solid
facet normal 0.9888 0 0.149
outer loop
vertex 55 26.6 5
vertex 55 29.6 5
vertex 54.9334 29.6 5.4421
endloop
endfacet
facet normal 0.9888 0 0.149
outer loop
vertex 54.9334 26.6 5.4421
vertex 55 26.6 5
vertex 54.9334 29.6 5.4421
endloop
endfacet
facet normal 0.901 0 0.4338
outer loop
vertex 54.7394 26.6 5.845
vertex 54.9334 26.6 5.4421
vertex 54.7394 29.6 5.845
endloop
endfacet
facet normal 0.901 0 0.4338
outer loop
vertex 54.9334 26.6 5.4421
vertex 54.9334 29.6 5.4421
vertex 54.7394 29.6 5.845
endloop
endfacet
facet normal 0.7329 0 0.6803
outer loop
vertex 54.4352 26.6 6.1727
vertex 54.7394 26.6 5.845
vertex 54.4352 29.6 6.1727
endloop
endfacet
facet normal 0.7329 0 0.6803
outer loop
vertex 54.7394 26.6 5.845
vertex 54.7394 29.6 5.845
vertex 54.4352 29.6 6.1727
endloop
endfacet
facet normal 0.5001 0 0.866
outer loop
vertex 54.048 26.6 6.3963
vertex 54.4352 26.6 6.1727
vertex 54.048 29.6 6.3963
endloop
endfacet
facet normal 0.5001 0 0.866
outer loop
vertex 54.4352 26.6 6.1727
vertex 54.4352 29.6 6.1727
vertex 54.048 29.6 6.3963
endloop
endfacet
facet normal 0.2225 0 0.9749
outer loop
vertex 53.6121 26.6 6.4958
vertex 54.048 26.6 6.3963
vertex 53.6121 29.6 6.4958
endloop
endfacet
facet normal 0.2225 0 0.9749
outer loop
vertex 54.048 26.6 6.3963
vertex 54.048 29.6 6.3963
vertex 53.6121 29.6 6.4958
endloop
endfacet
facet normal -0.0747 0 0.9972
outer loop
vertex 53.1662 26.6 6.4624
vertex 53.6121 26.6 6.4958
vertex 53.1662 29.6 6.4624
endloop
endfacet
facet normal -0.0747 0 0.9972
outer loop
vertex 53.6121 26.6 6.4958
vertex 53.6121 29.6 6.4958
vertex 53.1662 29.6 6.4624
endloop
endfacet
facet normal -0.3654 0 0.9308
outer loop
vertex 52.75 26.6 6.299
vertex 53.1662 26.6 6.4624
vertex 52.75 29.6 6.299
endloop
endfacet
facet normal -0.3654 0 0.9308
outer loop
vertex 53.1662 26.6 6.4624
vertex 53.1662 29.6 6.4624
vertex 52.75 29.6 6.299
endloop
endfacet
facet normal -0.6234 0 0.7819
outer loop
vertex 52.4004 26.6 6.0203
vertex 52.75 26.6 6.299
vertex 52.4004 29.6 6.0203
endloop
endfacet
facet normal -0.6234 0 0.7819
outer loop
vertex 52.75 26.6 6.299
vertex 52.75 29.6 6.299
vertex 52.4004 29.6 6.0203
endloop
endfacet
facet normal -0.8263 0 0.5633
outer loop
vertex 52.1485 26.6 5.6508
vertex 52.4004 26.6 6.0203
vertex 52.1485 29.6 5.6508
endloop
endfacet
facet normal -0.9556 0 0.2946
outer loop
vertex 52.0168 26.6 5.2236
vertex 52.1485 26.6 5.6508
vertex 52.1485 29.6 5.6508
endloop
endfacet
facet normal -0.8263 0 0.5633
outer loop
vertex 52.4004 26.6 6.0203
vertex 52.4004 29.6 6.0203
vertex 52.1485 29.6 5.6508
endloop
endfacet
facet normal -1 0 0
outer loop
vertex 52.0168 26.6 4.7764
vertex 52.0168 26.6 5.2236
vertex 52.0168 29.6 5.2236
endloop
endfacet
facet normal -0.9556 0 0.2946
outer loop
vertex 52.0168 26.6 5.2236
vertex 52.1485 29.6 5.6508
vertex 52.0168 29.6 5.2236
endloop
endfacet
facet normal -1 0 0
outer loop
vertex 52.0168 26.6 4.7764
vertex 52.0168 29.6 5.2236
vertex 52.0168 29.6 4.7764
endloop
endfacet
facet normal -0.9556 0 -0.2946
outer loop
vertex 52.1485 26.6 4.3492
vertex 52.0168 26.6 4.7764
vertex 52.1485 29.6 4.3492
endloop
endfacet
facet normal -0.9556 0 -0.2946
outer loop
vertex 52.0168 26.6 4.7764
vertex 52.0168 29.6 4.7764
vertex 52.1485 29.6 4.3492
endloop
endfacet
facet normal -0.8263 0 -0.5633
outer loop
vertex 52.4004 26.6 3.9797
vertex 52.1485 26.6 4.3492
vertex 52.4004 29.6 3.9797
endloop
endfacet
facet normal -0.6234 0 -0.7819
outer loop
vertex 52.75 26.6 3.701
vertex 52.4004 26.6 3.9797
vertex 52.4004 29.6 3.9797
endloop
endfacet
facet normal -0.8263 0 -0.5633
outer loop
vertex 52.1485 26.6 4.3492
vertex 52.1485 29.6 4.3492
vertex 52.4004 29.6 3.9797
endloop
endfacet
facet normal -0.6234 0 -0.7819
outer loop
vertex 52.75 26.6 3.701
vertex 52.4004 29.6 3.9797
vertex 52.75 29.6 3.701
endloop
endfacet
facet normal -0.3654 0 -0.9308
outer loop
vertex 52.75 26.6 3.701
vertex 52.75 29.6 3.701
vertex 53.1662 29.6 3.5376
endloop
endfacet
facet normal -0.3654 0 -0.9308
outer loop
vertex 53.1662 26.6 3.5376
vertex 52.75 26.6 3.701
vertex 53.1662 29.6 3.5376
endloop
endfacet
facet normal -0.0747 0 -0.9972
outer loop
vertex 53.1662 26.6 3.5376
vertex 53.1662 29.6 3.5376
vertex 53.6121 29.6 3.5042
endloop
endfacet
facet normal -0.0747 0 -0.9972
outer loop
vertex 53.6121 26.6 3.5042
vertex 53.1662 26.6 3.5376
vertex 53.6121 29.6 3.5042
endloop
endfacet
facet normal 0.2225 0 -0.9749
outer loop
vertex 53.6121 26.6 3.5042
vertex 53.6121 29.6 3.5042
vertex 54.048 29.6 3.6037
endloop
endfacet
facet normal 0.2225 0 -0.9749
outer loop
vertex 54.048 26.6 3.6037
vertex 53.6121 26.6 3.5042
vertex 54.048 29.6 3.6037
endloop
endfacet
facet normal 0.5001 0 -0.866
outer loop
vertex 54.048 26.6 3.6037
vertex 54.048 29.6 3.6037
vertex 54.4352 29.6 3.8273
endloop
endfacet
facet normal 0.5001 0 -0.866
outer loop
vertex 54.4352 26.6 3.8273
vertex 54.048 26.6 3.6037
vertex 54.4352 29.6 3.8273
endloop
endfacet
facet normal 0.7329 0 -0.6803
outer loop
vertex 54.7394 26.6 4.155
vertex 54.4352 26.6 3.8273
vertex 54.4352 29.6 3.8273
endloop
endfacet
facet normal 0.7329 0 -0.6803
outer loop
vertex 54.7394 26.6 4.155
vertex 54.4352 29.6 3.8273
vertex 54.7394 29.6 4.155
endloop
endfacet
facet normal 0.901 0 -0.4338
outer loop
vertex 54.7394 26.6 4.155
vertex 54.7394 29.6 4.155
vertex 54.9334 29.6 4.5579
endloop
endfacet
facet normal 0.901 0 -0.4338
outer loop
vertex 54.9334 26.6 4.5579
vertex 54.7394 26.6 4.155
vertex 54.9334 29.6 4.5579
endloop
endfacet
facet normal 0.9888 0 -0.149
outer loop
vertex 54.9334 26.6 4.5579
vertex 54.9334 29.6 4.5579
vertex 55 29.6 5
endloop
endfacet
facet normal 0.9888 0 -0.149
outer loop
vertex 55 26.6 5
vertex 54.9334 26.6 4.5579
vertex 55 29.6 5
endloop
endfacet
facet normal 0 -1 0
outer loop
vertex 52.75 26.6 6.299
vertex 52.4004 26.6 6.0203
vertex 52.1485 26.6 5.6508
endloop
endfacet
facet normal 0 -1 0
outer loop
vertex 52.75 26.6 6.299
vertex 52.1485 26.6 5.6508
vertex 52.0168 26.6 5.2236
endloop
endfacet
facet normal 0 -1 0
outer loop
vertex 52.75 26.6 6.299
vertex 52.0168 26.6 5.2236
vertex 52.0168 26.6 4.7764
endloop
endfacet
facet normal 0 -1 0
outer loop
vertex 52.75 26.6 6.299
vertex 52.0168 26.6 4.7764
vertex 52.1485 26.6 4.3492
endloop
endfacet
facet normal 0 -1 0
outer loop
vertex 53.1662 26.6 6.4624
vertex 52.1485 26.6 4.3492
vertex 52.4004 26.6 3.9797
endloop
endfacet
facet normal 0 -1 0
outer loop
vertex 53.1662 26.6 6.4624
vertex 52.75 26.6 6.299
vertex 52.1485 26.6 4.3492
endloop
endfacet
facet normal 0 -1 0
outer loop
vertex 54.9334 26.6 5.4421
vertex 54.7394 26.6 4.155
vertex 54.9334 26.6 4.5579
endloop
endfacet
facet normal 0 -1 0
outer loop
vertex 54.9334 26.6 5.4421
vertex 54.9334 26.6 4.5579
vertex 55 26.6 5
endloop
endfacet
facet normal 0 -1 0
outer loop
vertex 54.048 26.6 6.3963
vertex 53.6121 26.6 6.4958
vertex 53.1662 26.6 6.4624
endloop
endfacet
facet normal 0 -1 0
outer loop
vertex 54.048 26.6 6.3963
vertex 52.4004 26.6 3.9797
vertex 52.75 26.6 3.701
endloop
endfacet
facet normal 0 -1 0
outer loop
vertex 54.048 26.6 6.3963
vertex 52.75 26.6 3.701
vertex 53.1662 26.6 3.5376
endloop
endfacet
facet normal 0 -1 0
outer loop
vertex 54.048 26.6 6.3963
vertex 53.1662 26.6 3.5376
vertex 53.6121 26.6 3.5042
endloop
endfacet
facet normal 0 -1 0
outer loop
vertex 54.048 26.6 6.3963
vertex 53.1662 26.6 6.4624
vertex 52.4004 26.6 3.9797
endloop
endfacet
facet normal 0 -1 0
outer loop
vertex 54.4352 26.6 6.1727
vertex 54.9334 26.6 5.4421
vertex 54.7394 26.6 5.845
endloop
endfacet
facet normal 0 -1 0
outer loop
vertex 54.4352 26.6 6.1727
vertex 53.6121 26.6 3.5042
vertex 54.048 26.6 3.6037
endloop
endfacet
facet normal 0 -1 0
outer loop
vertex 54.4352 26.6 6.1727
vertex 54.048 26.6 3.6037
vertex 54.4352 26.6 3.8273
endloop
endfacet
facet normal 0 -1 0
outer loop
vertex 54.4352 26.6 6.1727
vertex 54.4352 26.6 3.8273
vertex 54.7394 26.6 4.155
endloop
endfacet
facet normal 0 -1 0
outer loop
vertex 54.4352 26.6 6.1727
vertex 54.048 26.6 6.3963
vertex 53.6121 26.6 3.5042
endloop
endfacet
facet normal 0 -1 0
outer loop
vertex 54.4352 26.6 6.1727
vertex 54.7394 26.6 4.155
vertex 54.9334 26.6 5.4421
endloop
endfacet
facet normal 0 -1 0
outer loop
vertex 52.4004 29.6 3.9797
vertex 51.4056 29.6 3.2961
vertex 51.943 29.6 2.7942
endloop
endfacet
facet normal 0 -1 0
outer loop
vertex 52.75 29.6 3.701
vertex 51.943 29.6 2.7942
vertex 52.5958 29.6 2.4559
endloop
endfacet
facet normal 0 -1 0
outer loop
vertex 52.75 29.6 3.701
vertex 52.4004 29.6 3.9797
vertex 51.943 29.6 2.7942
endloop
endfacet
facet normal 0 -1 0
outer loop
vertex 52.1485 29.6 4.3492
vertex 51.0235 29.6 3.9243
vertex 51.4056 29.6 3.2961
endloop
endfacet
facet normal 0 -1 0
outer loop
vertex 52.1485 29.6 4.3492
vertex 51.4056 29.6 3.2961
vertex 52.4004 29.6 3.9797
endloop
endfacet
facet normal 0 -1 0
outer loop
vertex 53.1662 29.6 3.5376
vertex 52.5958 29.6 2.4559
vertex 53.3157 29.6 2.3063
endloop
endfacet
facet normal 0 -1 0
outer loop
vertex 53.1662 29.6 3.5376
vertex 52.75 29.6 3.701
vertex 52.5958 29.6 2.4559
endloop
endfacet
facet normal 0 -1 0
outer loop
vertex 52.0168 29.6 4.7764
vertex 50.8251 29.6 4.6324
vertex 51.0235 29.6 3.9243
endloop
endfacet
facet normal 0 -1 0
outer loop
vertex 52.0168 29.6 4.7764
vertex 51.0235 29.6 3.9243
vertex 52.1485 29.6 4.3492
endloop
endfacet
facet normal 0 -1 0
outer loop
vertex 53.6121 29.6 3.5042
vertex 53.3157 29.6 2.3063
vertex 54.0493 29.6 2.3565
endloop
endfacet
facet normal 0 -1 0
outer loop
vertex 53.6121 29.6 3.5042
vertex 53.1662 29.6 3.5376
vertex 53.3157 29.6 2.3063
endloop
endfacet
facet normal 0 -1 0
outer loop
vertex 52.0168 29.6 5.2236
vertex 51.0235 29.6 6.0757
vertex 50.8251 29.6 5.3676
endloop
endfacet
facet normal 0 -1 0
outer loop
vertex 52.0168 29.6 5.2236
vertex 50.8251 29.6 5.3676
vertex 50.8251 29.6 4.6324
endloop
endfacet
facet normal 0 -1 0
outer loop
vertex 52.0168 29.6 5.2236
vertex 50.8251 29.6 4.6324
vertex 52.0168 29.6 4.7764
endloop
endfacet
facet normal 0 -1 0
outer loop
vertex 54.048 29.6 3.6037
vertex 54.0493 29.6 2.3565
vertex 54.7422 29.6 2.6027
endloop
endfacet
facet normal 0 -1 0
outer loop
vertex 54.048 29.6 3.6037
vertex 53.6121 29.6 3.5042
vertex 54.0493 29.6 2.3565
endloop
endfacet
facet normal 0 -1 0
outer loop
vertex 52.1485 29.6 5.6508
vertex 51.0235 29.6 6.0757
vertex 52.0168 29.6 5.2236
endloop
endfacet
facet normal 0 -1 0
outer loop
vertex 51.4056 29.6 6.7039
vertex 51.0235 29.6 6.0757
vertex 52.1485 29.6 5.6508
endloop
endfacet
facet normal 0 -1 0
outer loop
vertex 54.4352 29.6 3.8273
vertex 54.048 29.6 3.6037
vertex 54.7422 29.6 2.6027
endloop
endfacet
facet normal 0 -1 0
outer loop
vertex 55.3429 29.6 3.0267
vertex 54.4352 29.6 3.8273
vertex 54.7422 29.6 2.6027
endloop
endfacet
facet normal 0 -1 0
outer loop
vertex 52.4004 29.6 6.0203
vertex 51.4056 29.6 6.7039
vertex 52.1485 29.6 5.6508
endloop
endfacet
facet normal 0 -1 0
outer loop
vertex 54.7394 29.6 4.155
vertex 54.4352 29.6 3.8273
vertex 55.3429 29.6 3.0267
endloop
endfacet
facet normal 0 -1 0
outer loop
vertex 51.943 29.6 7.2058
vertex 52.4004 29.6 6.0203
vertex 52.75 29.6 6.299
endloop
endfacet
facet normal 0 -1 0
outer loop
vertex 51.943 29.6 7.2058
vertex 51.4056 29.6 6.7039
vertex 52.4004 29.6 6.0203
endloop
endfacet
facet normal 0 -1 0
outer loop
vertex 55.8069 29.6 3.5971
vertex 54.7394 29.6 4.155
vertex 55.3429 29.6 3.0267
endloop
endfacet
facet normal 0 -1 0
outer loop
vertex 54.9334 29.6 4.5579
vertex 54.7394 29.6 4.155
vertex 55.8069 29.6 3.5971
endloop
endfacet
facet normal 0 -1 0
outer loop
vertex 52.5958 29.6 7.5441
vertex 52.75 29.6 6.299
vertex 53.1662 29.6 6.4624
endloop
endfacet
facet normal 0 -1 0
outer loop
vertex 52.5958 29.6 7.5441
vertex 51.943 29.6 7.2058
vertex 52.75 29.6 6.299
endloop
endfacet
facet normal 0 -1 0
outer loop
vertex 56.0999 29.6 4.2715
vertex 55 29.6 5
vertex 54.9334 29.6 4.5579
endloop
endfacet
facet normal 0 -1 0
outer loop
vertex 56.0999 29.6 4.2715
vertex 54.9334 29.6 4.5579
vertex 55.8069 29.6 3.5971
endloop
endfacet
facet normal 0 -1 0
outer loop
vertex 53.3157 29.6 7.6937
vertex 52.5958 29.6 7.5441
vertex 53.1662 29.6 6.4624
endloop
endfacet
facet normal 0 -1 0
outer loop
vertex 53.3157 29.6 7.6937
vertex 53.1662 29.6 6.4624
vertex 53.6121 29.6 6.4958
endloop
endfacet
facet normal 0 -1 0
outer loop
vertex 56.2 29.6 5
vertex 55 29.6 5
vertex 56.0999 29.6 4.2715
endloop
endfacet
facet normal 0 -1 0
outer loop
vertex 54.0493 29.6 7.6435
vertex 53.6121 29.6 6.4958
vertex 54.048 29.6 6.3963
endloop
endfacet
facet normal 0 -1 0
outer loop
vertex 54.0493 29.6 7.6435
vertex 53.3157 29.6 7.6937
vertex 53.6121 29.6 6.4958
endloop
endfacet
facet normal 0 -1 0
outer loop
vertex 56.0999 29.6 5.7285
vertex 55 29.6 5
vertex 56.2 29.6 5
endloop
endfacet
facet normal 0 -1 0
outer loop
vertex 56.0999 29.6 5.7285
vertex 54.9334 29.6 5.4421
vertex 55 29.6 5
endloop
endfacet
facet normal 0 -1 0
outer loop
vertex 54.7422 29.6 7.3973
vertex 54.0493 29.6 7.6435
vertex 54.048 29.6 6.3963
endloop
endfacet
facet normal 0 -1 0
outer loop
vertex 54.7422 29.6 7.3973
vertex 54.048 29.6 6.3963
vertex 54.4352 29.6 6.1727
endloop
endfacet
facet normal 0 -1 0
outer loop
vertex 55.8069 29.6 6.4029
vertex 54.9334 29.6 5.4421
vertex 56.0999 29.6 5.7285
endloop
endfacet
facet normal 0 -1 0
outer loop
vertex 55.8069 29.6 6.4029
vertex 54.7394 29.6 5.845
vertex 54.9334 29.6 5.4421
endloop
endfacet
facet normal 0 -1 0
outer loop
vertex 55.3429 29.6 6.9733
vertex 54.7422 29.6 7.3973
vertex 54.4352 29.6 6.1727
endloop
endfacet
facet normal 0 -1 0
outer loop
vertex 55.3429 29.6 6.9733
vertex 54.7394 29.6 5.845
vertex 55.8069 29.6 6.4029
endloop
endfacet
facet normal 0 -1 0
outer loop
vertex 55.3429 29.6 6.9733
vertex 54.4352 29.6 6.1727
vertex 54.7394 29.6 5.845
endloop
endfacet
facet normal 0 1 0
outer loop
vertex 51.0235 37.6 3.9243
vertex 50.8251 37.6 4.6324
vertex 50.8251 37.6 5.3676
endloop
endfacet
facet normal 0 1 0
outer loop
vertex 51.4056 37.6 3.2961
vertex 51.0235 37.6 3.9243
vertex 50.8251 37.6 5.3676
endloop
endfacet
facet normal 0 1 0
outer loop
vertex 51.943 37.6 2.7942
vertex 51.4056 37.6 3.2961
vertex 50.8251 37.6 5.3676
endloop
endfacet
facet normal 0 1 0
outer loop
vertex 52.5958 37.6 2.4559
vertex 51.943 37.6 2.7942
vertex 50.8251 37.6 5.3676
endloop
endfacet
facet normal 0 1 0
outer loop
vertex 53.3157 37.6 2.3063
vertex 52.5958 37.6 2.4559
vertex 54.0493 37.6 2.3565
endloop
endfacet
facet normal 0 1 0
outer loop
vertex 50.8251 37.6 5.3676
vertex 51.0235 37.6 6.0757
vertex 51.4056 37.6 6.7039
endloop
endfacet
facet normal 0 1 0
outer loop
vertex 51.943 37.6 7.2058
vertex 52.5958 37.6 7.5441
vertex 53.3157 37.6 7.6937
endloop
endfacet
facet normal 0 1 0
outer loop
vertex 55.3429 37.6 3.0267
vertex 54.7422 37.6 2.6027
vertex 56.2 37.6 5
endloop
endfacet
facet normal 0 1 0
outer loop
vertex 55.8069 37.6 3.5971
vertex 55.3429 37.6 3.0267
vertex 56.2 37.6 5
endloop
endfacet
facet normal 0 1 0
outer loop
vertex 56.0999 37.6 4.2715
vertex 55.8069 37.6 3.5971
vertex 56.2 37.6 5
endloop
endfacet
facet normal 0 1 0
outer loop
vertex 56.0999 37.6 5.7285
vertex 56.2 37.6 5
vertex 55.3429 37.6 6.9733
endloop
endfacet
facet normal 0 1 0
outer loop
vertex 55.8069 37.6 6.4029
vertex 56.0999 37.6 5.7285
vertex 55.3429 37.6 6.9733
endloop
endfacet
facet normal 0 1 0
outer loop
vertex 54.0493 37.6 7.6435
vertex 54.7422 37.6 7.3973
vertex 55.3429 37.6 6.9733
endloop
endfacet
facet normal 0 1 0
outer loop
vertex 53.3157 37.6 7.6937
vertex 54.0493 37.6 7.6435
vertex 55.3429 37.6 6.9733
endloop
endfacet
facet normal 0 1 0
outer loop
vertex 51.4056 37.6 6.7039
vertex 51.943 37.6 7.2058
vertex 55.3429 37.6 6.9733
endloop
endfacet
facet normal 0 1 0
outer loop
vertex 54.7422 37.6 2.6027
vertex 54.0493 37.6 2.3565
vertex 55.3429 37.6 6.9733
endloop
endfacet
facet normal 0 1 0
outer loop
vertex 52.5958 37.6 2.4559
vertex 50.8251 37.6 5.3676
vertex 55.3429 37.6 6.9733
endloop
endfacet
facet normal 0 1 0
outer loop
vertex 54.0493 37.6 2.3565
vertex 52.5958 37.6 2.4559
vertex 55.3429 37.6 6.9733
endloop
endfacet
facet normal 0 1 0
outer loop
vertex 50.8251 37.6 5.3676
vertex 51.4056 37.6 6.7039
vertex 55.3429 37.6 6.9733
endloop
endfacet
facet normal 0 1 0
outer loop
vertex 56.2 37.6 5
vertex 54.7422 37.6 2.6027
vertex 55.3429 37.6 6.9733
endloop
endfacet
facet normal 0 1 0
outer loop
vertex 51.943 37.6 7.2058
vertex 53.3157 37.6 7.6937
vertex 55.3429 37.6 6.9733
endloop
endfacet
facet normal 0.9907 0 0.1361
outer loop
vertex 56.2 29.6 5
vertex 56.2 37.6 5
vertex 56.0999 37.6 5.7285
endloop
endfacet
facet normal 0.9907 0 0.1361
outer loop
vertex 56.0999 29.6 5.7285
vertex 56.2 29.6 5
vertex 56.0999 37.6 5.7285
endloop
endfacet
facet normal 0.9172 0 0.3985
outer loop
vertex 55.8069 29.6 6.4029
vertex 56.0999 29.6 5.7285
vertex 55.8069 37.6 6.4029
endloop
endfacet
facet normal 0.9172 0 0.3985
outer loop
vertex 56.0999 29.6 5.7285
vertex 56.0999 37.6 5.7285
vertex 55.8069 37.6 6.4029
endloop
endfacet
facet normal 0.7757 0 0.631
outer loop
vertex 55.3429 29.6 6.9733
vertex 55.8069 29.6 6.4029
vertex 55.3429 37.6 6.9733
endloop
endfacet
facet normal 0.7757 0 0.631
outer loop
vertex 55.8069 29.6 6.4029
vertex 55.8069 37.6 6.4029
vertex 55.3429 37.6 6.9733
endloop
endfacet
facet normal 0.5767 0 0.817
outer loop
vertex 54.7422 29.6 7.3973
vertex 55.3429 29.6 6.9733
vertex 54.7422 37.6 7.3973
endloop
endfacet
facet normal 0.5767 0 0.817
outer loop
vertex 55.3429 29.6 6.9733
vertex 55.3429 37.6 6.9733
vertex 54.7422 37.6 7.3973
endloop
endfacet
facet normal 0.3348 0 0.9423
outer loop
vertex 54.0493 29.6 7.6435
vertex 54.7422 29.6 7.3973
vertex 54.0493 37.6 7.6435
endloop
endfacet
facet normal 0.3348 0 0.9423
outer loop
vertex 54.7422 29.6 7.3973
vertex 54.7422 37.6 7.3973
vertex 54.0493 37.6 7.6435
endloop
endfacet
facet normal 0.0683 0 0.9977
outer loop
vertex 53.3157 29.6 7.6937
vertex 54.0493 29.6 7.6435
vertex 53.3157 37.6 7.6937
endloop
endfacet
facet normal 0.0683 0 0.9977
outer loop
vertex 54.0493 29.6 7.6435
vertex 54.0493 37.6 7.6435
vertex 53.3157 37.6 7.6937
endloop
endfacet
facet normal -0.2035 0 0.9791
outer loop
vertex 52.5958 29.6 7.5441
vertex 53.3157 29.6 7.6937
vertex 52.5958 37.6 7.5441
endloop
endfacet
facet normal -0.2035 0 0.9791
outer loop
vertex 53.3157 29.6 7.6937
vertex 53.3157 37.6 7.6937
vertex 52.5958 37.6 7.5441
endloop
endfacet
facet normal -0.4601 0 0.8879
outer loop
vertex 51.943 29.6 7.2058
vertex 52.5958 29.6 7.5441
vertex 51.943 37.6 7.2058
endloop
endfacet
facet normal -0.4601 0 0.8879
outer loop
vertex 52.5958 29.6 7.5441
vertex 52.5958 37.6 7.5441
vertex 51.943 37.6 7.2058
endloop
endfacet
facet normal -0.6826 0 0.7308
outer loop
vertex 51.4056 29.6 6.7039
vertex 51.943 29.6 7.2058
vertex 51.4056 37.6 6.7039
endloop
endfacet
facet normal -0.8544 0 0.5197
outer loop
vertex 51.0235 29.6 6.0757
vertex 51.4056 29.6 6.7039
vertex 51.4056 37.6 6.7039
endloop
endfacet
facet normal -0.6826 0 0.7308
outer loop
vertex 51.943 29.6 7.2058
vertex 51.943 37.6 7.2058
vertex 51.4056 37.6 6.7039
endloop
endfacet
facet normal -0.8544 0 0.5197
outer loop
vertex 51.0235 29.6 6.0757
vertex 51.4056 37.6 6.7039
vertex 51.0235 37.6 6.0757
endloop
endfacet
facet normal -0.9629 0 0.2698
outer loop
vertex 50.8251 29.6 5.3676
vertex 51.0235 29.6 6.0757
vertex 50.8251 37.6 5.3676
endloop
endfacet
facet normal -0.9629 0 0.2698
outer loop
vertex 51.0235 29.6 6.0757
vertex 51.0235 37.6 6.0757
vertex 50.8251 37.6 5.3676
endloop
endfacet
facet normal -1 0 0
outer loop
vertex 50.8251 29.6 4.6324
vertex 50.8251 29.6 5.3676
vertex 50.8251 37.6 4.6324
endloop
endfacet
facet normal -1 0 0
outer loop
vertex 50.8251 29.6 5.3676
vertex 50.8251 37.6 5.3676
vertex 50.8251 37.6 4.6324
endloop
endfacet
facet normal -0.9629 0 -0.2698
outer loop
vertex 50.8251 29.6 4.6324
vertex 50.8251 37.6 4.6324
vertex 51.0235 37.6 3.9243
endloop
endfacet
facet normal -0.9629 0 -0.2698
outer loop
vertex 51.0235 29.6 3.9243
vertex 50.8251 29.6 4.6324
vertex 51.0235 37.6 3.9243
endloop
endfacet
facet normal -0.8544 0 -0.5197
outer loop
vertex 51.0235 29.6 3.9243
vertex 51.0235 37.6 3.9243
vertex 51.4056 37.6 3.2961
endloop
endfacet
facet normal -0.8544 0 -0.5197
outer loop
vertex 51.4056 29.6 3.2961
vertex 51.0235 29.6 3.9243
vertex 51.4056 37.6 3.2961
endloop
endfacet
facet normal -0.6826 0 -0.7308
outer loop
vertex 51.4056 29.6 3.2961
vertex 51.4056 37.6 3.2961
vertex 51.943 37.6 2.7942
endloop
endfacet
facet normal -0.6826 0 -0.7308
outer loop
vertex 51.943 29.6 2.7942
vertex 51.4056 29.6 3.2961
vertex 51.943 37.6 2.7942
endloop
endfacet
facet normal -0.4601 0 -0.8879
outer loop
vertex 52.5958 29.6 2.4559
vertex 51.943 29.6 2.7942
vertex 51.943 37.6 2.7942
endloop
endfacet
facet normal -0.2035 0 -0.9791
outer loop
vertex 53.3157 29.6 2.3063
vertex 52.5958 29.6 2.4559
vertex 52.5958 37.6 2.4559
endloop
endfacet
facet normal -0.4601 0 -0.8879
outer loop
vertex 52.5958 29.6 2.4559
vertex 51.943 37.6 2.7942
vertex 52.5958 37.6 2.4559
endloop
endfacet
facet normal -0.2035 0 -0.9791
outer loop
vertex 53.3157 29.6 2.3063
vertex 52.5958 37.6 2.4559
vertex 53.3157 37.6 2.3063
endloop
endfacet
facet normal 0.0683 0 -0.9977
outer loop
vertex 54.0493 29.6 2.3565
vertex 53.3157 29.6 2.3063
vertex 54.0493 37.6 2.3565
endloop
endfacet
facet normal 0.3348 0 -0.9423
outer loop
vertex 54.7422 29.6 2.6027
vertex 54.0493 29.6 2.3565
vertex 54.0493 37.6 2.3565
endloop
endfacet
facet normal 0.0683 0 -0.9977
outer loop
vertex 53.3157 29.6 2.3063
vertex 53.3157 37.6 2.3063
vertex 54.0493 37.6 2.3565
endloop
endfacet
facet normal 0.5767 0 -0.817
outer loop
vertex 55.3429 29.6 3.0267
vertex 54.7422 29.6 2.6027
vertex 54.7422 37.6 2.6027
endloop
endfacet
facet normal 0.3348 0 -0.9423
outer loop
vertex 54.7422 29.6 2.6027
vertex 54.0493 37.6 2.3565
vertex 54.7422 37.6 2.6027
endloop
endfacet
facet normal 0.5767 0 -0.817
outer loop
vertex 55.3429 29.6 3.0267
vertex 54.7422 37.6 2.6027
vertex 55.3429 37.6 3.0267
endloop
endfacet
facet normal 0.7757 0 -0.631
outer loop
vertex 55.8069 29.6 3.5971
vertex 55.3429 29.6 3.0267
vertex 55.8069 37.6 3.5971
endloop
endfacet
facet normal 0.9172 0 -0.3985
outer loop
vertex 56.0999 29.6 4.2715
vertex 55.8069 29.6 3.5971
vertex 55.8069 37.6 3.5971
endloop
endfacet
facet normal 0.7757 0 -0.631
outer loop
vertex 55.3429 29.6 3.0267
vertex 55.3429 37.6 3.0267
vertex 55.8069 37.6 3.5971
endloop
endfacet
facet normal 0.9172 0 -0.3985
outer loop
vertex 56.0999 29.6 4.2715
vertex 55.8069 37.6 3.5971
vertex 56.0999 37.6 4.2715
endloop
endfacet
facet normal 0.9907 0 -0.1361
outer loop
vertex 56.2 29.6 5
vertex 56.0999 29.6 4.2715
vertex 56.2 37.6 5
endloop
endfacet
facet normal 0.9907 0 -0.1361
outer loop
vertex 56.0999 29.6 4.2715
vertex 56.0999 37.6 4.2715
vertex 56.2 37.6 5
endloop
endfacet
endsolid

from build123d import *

# Parameters (mm, degrees)
CYLINDER012_R     = 2.7
CYLINDER012_DEPTH = 8
CYLINDER008_R     = 1.5
CYLINDER008_DEPTH = 11


with BuildPart() as cylinder012:
    # Cylinder012 → Cylinder012 (new body)
    with BuildSketch(Plane(origin=(53.5, 37.6, 5), x_dir=(1, 0, 0), z_dir=(0, -1, 0))):
        Circle(CYLINDER012_R)
    extrude(amount=CYLINDER012_DEPTH)


with BuildPart() as fusion016:
    # Cylinder008 → Cylinder008 (new body)
    with BuildSketch(Plane(origin=(53.5, 37.6, 5), x_dir=(1, 0, 0), z_dir=(0, -1, 0))):
        Circle(CYLINDER008_R)
    extrude(amount=CYLINDER008_DEPTH)

    # Fusion016: union Cylinder012
    add(cylinder012.part)


solid = fusion016.part
